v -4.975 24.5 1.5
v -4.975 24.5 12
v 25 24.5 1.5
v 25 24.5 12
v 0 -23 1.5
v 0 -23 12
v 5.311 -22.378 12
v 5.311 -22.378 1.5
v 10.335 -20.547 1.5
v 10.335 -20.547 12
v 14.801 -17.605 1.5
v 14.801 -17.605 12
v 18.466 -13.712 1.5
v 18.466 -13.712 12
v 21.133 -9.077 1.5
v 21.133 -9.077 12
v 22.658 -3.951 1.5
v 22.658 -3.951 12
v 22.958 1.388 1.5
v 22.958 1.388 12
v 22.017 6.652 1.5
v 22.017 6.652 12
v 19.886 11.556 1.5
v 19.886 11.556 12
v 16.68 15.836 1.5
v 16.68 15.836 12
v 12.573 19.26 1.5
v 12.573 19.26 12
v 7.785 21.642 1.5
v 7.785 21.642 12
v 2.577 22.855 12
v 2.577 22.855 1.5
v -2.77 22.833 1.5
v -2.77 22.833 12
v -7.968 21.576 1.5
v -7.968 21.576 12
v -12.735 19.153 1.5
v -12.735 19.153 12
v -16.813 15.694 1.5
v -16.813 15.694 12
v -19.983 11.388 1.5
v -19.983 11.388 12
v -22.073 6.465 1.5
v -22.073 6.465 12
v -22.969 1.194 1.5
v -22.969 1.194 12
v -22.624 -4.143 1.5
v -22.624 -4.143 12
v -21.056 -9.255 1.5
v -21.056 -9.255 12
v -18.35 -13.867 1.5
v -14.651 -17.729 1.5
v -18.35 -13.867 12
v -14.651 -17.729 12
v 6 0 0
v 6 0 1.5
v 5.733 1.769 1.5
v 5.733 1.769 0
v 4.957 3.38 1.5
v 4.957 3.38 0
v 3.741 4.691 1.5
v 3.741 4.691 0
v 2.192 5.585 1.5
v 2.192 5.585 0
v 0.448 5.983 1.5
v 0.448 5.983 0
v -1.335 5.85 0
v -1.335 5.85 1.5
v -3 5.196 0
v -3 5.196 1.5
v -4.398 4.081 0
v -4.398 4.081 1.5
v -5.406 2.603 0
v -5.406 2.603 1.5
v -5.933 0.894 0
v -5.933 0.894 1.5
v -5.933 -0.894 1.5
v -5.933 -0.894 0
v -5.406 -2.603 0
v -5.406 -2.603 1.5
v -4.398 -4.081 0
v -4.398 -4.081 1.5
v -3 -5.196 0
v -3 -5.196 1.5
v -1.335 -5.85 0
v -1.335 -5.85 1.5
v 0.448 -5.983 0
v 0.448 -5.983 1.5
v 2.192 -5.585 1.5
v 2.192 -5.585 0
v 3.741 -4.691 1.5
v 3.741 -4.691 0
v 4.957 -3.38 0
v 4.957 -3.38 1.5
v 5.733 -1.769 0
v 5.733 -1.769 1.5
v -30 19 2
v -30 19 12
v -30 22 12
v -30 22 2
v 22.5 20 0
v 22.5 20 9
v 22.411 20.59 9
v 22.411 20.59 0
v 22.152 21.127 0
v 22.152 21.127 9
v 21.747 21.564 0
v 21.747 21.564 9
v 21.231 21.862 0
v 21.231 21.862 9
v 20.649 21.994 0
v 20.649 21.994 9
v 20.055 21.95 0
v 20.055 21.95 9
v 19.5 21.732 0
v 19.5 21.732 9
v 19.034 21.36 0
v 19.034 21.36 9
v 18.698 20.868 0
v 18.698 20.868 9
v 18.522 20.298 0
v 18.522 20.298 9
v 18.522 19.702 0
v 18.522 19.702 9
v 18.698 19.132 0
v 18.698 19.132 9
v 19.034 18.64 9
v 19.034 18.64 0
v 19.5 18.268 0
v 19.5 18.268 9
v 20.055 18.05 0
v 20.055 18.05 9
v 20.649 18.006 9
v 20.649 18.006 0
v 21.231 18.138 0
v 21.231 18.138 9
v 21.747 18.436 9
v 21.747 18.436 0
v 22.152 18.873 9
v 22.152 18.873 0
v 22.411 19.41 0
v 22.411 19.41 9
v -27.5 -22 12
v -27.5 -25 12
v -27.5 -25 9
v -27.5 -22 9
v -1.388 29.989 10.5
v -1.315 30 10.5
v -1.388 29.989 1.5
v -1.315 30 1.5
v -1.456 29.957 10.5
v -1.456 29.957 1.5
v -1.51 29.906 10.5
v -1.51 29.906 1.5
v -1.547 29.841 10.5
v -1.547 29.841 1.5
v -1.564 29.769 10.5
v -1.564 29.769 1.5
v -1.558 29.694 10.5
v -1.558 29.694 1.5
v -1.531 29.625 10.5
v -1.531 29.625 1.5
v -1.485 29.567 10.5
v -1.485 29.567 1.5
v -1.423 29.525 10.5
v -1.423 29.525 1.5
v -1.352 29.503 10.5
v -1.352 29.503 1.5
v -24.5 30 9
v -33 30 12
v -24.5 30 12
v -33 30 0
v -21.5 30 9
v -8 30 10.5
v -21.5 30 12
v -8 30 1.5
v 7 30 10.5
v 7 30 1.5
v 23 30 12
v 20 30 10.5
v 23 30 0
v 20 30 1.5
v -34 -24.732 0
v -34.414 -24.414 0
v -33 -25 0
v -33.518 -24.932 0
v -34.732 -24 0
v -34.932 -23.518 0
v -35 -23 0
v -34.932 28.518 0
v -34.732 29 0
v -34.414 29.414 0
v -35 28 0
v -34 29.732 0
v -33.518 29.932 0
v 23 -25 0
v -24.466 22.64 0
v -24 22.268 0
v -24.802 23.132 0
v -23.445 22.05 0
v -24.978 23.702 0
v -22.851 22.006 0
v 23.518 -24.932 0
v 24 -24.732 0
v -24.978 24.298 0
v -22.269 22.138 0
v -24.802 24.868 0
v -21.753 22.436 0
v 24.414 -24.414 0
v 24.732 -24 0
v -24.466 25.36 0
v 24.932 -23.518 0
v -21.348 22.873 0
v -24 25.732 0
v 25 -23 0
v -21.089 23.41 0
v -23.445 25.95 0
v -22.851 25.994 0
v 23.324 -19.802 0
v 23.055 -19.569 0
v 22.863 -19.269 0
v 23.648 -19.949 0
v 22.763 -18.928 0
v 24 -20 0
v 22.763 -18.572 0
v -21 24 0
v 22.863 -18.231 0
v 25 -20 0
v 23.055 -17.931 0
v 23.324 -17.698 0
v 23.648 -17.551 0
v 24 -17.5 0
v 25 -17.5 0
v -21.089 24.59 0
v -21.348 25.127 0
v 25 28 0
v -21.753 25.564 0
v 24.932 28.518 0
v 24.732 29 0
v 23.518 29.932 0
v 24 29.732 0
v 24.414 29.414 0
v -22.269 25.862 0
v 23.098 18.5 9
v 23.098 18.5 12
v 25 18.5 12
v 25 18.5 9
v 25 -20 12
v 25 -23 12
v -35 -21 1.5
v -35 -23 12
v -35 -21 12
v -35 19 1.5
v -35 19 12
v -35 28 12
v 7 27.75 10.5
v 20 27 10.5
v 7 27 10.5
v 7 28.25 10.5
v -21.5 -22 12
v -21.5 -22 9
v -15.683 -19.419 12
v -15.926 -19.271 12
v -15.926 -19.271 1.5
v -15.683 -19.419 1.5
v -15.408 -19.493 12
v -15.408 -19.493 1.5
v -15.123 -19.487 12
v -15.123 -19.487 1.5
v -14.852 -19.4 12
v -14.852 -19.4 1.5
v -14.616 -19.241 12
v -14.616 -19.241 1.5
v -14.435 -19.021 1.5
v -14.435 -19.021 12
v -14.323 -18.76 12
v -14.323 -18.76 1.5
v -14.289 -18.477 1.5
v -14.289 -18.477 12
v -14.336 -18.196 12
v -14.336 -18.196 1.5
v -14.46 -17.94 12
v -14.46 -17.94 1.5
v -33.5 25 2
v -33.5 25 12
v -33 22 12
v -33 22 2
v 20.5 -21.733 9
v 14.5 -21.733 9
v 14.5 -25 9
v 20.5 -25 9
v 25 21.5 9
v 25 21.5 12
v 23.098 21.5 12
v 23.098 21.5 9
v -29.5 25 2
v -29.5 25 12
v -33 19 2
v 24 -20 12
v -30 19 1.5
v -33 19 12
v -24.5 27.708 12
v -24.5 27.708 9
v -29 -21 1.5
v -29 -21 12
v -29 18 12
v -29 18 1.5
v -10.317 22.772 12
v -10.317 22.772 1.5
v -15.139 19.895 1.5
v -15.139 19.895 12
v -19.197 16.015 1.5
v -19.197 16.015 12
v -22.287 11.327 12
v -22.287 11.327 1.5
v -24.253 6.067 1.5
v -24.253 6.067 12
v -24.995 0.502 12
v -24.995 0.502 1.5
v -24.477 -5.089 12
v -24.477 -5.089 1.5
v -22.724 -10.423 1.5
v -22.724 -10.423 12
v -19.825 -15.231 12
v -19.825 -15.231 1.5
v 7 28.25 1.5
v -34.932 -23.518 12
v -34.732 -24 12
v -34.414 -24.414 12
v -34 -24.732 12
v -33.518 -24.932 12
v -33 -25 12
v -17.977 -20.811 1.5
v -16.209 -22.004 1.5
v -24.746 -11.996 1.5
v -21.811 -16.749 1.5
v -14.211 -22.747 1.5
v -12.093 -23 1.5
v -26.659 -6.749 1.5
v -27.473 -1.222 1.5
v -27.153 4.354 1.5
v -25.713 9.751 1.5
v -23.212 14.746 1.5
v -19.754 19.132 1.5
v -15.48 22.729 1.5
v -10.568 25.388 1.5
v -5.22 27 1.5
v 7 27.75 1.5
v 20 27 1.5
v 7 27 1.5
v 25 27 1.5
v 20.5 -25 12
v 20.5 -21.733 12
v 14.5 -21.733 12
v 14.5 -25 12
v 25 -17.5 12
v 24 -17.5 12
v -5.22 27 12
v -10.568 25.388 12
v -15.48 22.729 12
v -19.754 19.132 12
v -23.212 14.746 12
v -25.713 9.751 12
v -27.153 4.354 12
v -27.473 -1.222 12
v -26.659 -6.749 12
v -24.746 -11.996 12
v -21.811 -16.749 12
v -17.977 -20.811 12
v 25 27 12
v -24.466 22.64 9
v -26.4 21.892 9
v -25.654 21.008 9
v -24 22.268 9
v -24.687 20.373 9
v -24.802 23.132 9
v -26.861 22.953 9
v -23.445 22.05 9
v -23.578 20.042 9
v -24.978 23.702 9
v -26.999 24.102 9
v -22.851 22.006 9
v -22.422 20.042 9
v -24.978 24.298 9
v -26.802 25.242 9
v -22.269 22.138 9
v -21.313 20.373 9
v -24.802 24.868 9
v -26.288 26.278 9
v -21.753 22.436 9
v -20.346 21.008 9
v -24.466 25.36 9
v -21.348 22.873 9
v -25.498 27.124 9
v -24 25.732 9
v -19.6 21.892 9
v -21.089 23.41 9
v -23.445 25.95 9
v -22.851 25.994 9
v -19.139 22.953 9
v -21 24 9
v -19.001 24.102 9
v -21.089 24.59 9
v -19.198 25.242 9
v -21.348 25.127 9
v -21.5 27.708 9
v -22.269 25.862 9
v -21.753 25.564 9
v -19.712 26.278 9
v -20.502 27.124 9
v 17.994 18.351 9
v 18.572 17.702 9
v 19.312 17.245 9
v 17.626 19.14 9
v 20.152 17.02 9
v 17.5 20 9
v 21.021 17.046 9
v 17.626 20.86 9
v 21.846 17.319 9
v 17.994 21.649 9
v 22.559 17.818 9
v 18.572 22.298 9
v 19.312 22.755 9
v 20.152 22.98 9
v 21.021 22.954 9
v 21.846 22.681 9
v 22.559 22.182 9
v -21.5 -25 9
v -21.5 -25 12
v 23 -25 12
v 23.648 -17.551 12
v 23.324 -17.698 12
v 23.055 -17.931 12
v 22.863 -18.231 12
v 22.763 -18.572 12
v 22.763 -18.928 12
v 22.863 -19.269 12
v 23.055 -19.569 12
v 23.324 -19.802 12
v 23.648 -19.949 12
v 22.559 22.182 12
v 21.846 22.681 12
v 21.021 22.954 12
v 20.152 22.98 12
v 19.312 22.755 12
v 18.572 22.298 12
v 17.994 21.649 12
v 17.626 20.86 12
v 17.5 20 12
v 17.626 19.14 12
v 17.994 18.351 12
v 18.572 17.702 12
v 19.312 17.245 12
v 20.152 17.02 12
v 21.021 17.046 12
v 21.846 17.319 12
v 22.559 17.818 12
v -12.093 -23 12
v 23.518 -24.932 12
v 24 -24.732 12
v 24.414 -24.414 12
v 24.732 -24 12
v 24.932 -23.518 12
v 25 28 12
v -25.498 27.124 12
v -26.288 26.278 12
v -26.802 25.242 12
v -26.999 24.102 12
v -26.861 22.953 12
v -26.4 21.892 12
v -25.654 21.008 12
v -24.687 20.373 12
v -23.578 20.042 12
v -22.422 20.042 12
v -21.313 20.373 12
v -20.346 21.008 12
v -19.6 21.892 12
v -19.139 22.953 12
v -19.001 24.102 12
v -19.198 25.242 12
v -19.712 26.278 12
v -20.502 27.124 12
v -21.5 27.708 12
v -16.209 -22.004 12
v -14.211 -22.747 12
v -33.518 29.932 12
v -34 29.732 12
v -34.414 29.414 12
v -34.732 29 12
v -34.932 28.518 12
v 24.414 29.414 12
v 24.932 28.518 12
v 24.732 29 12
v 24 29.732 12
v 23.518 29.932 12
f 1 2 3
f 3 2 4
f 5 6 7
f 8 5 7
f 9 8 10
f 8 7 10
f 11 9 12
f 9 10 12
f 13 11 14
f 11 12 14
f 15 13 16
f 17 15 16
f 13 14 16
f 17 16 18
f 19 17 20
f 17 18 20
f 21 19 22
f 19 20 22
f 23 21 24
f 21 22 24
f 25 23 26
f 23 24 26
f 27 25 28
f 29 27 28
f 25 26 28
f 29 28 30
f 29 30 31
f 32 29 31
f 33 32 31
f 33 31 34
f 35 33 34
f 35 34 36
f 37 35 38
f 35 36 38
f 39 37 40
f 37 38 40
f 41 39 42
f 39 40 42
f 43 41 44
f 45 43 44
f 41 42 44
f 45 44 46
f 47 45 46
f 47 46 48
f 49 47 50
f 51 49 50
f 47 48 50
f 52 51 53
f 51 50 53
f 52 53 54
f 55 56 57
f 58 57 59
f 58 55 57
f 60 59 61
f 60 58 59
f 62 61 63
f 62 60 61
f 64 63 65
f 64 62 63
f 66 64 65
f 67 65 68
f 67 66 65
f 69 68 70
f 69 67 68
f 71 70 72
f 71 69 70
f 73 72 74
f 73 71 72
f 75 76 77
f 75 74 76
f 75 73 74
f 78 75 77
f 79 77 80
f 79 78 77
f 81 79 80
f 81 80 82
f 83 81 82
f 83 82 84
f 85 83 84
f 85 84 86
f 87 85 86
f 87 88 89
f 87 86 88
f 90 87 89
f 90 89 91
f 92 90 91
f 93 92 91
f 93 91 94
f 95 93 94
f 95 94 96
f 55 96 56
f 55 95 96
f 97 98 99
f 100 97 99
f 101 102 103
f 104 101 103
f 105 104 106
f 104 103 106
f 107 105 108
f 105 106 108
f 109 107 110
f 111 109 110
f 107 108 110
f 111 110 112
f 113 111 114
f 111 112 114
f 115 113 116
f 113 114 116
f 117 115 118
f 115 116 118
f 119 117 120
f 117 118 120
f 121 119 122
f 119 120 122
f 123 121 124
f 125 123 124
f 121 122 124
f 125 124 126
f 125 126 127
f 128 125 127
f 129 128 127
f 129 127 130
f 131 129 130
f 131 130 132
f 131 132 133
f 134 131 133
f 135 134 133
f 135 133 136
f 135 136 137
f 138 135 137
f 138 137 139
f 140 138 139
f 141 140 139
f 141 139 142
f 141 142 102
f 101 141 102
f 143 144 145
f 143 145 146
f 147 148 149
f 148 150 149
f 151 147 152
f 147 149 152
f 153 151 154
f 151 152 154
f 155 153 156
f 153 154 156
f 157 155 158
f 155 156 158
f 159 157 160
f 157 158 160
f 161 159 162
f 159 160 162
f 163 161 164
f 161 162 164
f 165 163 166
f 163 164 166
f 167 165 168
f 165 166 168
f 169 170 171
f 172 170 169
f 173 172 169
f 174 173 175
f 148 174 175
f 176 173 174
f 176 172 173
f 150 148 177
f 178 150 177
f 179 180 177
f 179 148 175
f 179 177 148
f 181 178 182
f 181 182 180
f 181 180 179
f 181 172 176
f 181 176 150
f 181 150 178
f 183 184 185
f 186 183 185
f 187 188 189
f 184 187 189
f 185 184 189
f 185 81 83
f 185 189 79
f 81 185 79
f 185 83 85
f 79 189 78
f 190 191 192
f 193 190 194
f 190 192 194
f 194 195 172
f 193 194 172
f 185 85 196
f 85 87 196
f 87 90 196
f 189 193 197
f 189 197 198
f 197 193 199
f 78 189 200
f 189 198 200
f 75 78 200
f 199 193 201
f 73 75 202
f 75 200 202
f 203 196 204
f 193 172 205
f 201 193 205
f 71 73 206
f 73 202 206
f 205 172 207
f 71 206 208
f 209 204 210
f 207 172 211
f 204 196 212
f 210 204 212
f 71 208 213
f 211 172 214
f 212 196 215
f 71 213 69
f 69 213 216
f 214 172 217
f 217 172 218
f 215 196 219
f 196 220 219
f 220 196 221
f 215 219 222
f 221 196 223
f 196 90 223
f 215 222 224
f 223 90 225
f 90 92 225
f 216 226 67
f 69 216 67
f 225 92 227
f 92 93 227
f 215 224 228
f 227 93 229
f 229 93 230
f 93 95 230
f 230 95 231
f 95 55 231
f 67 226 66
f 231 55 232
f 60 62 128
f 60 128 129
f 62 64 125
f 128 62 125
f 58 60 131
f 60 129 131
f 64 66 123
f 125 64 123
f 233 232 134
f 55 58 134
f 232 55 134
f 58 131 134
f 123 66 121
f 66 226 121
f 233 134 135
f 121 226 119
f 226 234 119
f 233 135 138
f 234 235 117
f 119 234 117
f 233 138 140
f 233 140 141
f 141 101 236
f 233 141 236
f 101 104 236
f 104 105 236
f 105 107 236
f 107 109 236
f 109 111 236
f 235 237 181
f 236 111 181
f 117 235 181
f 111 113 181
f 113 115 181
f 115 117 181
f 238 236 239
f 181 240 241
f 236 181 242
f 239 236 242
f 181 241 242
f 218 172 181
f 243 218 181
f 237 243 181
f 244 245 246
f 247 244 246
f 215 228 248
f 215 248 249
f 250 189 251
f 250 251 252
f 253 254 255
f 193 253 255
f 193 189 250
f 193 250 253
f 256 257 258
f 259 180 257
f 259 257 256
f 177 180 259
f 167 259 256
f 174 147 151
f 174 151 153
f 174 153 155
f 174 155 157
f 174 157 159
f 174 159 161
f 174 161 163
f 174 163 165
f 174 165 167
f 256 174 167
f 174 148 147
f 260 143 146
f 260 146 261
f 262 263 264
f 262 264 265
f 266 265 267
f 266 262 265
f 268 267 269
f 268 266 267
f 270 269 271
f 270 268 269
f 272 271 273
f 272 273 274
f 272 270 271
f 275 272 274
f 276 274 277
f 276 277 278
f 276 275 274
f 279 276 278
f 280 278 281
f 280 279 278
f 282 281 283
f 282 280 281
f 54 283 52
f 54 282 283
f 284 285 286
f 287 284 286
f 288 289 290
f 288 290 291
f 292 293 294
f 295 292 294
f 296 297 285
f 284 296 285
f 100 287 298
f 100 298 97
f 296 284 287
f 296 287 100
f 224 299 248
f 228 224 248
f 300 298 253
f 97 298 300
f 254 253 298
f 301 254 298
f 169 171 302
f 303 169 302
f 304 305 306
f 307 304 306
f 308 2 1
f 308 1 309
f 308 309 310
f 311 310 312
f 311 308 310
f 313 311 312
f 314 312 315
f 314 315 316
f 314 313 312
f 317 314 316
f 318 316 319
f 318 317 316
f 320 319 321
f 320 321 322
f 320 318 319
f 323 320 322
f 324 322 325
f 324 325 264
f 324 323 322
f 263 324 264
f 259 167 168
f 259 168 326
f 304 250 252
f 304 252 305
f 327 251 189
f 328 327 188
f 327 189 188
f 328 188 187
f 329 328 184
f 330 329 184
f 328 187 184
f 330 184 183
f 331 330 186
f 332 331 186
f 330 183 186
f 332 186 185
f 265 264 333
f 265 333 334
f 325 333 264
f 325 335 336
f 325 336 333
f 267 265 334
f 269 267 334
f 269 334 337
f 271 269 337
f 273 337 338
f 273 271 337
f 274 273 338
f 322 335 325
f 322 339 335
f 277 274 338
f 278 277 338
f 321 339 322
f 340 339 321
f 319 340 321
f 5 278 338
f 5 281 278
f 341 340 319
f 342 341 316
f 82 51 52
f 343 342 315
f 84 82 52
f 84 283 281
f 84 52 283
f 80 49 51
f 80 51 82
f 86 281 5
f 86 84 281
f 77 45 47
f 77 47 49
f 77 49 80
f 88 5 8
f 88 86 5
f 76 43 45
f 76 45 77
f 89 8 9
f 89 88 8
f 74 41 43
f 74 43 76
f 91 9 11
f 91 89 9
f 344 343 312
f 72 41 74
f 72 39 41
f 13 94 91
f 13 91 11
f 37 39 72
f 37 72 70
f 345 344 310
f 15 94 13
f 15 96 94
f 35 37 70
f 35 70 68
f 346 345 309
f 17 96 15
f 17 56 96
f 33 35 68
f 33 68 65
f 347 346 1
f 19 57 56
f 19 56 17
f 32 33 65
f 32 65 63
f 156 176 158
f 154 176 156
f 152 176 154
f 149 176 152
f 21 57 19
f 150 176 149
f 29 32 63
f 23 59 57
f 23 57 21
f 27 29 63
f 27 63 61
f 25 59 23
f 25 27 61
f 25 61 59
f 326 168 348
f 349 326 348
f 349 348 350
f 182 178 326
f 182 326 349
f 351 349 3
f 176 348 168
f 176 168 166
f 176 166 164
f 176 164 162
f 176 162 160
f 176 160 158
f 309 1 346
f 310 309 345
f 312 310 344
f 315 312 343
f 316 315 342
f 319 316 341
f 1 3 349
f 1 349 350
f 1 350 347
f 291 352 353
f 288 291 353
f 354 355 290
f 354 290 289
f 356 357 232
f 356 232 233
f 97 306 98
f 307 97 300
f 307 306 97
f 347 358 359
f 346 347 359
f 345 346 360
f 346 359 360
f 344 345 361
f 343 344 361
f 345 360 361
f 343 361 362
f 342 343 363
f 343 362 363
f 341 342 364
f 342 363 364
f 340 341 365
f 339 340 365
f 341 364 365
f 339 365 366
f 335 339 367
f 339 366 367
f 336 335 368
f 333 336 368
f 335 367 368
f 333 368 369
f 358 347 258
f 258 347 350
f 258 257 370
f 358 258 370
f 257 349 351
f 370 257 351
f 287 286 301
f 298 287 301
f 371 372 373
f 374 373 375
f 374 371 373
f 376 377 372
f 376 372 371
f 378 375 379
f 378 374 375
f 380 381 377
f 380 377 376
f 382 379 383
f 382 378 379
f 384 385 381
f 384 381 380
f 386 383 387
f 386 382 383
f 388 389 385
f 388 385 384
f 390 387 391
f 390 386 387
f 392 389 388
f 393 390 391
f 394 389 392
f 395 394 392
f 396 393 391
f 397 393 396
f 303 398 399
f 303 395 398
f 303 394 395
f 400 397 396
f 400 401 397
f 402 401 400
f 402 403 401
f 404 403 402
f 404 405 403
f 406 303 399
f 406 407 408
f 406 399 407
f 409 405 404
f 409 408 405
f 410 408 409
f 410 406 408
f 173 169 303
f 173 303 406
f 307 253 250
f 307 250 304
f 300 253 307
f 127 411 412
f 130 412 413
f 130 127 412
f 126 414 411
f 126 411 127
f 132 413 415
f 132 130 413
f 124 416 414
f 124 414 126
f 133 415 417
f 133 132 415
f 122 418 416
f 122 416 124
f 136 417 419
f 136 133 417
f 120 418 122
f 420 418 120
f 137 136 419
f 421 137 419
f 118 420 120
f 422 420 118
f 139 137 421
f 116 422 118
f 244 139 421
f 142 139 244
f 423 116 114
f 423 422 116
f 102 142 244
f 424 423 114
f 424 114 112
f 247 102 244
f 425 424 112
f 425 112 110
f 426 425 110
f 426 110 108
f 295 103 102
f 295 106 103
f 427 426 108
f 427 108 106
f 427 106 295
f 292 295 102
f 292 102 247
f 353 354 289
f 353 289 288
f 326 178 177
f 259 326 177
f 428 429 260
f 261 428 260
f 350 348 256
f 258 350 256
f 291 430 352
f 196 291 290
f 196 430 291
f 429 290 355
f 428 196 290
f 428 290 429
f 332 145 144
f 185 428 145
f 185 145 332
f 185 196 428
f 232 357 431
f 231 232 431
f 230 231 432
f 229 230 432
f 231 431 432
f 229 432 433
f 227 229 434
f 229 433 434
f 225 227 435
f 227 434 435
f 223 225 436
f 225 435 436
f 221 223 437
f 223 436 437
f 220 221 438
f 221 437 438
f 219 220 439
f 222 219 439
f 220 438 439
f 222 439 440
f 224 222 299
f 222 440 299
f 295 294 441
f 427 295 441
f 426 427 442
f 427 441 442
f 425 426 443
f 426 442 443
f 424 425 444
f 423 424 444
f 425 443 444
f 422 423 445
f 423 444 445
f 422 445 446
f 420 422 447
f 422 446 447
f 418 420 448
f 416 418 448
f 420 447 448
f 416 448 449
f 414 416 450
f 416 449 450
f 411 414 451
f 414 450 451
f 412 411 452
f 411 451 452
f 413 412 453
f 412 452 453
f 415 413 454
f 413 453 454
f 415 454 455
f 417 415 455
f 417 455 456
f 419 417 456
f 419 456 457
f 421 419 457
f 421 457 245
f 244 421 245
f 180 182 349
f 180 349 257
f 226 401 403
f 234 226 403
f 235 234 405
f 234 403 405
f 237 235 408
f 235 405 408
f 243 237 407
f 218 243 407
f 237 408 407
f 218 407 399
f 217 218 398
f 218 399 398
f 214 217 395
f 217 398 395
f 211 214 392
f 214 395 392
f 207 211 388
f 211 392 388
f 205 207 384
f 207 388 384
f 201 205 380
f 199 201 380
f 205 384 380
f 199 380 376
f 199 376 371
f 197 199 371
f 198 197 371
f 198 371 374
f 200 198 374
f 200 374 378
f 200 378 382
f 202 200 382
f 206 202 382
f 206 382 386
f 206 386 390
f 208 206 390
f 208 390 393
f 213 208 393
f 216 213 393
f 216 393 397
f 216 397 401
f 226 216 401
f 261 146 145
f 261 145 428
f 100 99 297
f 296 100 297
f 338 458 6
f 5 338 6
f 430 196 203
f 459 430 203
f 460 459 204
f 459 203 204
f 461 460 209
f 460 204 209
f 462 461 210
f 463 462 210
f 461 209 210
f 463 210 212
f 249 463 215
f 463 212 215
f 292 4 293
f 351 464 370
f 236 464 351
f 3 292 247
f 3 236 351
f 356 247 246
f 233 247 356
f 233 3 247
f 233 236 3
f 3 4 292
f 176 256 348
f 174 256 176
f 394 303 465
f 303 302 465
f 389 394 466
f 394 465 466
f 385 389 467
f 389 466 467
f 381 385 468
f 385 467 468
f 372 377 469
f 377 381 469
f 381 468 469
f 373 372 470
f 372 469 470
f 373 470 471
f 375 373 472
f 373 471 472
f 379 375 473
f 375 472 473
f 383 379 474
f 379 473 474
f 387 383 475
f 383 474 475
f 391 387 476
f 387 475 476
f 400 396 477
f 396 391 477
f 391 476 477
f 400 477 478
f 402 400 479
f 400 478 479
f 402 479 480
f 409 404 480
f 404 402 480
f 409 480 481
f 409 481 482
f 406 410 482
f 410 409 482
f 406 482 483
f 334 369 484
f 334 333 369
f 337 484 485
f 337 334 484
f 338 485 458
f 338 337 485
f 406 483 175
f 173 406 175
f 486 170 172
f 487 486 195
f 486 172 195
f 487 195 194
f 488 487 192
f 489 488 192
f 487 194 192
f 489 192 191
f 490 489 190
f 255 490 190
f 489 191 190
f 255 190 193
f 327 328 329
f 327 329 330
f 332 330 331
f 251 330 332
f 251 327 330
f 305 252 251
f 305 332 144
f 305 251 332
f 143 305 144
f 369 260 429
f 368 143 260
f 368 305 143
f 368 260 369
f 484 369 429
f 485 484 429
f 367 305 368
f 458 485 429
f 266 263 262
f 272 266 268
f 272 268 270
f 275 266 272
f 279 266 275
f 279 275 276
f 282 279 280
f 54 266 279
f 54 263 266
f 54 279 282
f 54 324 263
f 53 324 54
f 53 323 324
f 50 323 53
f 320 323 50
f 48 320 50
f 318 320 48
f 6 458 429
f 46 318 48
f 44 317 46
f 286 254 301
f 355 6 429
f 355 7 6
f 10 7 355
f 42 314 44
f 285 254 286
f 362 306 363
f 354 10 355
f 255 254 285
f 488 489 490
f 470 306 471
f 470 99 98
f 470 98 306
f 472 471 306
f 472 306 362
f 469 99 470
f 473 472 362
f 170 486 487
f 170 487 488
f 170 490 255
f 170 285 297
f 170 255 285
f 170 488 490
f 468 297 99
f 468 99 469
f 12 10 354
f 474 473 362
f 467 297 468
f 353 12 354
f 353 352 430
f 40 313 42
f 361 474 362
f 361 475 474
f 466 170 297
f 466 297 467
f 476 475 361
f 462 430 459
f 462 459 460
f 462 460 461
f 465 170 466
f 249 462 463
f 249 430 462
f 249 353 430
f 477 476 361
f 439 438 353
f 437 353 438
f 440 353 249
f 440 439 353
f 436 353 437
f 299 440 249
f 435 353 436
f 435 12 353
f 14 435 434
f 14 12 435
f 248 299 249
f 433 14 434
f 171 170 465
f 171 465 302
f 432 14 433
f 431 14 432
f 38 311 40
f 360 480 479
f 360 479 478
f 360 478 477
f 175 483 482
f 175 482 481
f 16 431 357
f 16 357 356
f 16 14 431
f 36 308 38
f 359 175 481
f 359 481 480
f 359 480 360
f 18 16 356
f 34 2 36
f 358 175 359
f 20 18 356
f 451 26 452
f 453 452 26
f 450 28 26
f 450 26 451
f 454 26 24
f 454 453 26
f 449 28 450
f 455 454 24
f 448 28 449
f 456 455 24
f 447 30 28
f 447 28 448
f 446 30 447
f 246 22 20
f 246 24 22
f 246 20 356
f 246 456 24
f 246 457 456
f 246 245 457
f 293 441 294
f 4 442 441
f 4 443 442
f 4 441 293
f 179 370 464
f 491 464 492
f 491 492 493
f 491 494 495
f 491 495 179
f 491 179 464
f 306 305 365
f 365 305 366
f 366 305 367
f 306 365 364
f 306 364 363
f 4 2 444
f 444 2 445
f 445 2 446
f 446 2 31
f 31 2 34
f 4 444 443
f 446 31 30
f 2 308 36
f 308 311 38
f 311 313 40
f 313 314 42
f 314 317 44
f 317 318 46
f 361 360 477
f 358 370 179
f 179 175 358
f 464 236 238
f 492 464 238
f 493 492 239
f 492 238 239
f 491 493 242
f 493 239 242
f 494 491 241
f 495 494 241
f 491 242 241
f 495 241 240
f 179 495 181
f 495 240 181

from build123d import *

# Parameters (mm, degrees)
SKETCH_R        = 6
PAD_DEPTH       = 12
POCKET_DEPTH    = 10.5
FILLET_R        = 9
POCKET001_DEPTH = 12.001
SKETCH003_W     = 6
SKETCH003_H     = 40
POCKET002_DEPTH = 10.5
POCKET003_DEPTH = 10
SKETCH005_R     = 4
SKETCH005_R_2   = 3
SKETCH005_W     = 6
SKETCH005_H     = 3
SKETCH005_H_2   = 3.266556
POCKET004_DEPTH = 3
SKETCH006_W     = 13
SKETCH006_H     = 9
POCKET005_DEPTH = 5
POCKET006_DEPTH = 10.5
SKETCH008_W     = 15
SKETCH008_H     = 3
POCKET007_DEPTH = 1.5
SKETCH009_W     = 15
SKETCH009_H     = 3
PAD001_DEPTH    = 1.5
POCKET008_DEPTH = 3
FILLET001_R     = 0.25
SKETCH011_R     = 2
POCKET009_DEPTH = 9.001
CHAMFER_SIZE    = 1


with BuildPart() as part:
    # Sketch → Pad (new body)
    with BuildSketch(Plane.XY):
        with BuildLine():
            ThreePointArc((-33, 30), (-34.414214, 29.414214), (-35, 28))
            Line((-35, -23), (-35, 28))
            ThreePointArc((-35, -23), (-34.414214, -24.414214), (-33, -25))
            Line((23, -25), (-33, -25))
            ThreePointArc((23, -25), (24.414214, -24.414214), (25, -23))
            Line((25, 28), (25, -23))
            ThreePointArc((25, 28), (24.414214, 29.414214), (23, 30))
            Line((-33, 30), (23, 30))
        make_face()
        Circle(SKETCH_R, mode=Mode.SUBTRACT)
    extrude(amount=PAD_DEPTH)

    # Sketch001 (on Face11 of Pad) → Pocket (cut)
    with BuildSketch(Plane.XY.offset(12)):
        with BuildLine():
            ThreePointArc((0, -23), (7.785306, 21.642297), (-14.651471, -17.729479))
            ThreePointArc((-15.925512, -19.271172), (-14.517644, -19.137346), (-14.651471, -17.729479))
            ThreePointArc((-4.974937, 24.5), (-24.252548, 6.067448), (-15.925512, -19.271172))
            Line((-4.974937, 24.5), (25, 24.5))
            Line((25, 24.5), (25, 27))
            Line((25, 27), (-5.220153, 27))
            ThreePointArc((-5.220153, 27), (-26.980945, 5.317761), (-15.074813, -23))
            Line((-15.074813, -23), (0, -23))
        make_face()
    extrude(amount=-POCKET_DEPTH, mode=Mode.SUBTRACT)

    # Fillet
    fillet_edges = [part.edges().sort_by_distance(p)[0] for p in [
        (-15.074813, -23, 6.75),
    ]]
    fillet(fillet_edges, radius=FILLET_R)

    # Sketch002 (on Face1 of Fillet) → Pocket001 (cut, through all)
    with BuildSketch(Plane.XY.offset(12)):
        with BuildLine():
            ThreePointArc((24, -17.5), (22.75, -18.75), (24, -20))
            Line((24, -20), (25, -20))
            Line((25, -17.5), (25, -20))
            Line((24, -17.5), (25, -17.5))
        make_face()
    extrude(amount=-POCKET001_DEPTH, mode=Mode.SUBTRACT)

    # Sketch003 (on Face1 of Pocket001) → Pocket002 (cut)
    with BuildSketch(Plane.XY.offset(12)):
        with Locations((-32, -1)):
            Rectangle(SKETCH003_W, SKETCH003_H)
    extrude(amount=-POCKET002_DEPTH, mode=Mode.SUBTRACT)

    # Sketch004 (on Face1 of Pocket002) → Pocket003 (cut)
    with BuildSketch(Plane.XY.offset(12)):
        Polygon((-33, 22), (-33, 19), (-30, 19), (-30, 22), (-29.5, 25), (-33.5, 25), align=None)
    extrude(amount=-POCKET003_DEPTH, mode=Mode.SUBTRACT)

    # Sketch005 (on Face1 of Pocket003) → Pocket004 (cut)
    with BuildSketch(Plane.XY.offset(12)):
        with Locations((-23, 24)):
            Circle(SKETCH005_R)
        with Locations((20.5, 20)):
            Circle(SKETCH005_R_2)
        with Locations((-24.5, -23.5)):
            Rectangle(SKETCH005_W, SKETCH005_H)
        with Locations((17.5, -23.366722)):
            Rectangle(SKETCH005_W, SKETCH005_H_2)
    extrude(amount=-POCKET004_DEPTH, mode=Mode.SUBTRACT)

    # Sketch006 (on Face32 of Pocket004) → Pocket005 (cut)
    with BuildSketch(Plane(origin=(0, 30, 0), x_dir=(-1, 0, 0), z_dir=(0, 1, 0))):
        with Locations((-13.5, 6)):
            Rectangle(SKETCH006_W, SKETCH006_H)
    extrude(amount=-POCKET005_DEPTH, mode=Mode.SUBTRACT)

    # Sketch007 (on Face1 of Pocket005) → Pocket006 (cut)
    with BuildSketch(Plane.XY.offset(12)):
        Polygon((7, 27.75), (-8, 30), (-4.666667, 30), (7, 28.25), align=None)
    extrude(amount=-POCKET006_DEPTH, mode=Mode.SUBTRACT)

    # Sketch008 (on Face1 of Pocket006) → Pocket007 (cut)
    with BuildSketch(Plane.XY.offset(12)):
        with Locations((-0.5, 28.5)):
            Rectangle(SKETCH008_W, SKETCH008_H)
    extrude(amount=-POCKET007_DEPTH, mode=Mode.SUBTRACT)

    # Sketch009 (on Face54 of Pocket007) → Pad001 (join)
    with BuildSketch(Plane.XY.offset(10.5)):
        with Locations((-0.5, 28.5)):
            Rectangle(SKETCH009_W, SKETCH009_H)
    extrude(amount=PAD001_DEPTH)

    # Sketch010 (on Face45 of Pad001) → Pocket008 (cut)
    with BuildSketch(Plane.XY.offset(12)):
        with BuildLine():
            Line((-24.5, 30), (-24.5, 27.708099))
            ThreePointArc((-21.5, 27.708099), (-23, 28), (-24.5, 27.708099))
            Line((-21.5, 27.708099), (-21.5, 30))
            Line((-21.5, 30), (-24.5, 30))
        make_face()
        with BuildLine():
            Line((23.098076, 18.5), (25, 18.5))
            Line((25, 18.5), (25, 21.5))
            Line((25, 21.5), (23.098076, 21.5))
            ThreePointArc((23.098076, 18.5), (23.5, 20), (23.098076, 21.5))
        make_face()
    extrude(amount=-POCKET008_DEPTH, mode=Mode.SUBTRACT)

    # Fillet001
    fillet001_edges = [part.edges().sort_by_distance(p)[0] for p in [
        (-4.666667, 30, 6),
    ]]
    fillet(fillet001_edges, radius=FILLET001_R)

    # Sketch011 (on Face24 of Fillet001) → Pocket009 (cut, through all)
    with BuildSketch(Plane.XY.offset(9)):
        with Locations((-23, 24)):
            Circle(SKETCH011_R)
        with Locations((20.5, 20)):
            Circle(SKETCH011_R)
    extrude(amount=-POCKET009_DEPTH, mode=Mode.SUBTRACT)

    # Chamfer
    chamfer_edges = [part.edges().sort_by_distance(p)[0] for p in [
        (-29, 19, 6.75),
    ]]
    chamfer(chamfer_edges, length=CHAMFER_SIZE)


solid = part.part
